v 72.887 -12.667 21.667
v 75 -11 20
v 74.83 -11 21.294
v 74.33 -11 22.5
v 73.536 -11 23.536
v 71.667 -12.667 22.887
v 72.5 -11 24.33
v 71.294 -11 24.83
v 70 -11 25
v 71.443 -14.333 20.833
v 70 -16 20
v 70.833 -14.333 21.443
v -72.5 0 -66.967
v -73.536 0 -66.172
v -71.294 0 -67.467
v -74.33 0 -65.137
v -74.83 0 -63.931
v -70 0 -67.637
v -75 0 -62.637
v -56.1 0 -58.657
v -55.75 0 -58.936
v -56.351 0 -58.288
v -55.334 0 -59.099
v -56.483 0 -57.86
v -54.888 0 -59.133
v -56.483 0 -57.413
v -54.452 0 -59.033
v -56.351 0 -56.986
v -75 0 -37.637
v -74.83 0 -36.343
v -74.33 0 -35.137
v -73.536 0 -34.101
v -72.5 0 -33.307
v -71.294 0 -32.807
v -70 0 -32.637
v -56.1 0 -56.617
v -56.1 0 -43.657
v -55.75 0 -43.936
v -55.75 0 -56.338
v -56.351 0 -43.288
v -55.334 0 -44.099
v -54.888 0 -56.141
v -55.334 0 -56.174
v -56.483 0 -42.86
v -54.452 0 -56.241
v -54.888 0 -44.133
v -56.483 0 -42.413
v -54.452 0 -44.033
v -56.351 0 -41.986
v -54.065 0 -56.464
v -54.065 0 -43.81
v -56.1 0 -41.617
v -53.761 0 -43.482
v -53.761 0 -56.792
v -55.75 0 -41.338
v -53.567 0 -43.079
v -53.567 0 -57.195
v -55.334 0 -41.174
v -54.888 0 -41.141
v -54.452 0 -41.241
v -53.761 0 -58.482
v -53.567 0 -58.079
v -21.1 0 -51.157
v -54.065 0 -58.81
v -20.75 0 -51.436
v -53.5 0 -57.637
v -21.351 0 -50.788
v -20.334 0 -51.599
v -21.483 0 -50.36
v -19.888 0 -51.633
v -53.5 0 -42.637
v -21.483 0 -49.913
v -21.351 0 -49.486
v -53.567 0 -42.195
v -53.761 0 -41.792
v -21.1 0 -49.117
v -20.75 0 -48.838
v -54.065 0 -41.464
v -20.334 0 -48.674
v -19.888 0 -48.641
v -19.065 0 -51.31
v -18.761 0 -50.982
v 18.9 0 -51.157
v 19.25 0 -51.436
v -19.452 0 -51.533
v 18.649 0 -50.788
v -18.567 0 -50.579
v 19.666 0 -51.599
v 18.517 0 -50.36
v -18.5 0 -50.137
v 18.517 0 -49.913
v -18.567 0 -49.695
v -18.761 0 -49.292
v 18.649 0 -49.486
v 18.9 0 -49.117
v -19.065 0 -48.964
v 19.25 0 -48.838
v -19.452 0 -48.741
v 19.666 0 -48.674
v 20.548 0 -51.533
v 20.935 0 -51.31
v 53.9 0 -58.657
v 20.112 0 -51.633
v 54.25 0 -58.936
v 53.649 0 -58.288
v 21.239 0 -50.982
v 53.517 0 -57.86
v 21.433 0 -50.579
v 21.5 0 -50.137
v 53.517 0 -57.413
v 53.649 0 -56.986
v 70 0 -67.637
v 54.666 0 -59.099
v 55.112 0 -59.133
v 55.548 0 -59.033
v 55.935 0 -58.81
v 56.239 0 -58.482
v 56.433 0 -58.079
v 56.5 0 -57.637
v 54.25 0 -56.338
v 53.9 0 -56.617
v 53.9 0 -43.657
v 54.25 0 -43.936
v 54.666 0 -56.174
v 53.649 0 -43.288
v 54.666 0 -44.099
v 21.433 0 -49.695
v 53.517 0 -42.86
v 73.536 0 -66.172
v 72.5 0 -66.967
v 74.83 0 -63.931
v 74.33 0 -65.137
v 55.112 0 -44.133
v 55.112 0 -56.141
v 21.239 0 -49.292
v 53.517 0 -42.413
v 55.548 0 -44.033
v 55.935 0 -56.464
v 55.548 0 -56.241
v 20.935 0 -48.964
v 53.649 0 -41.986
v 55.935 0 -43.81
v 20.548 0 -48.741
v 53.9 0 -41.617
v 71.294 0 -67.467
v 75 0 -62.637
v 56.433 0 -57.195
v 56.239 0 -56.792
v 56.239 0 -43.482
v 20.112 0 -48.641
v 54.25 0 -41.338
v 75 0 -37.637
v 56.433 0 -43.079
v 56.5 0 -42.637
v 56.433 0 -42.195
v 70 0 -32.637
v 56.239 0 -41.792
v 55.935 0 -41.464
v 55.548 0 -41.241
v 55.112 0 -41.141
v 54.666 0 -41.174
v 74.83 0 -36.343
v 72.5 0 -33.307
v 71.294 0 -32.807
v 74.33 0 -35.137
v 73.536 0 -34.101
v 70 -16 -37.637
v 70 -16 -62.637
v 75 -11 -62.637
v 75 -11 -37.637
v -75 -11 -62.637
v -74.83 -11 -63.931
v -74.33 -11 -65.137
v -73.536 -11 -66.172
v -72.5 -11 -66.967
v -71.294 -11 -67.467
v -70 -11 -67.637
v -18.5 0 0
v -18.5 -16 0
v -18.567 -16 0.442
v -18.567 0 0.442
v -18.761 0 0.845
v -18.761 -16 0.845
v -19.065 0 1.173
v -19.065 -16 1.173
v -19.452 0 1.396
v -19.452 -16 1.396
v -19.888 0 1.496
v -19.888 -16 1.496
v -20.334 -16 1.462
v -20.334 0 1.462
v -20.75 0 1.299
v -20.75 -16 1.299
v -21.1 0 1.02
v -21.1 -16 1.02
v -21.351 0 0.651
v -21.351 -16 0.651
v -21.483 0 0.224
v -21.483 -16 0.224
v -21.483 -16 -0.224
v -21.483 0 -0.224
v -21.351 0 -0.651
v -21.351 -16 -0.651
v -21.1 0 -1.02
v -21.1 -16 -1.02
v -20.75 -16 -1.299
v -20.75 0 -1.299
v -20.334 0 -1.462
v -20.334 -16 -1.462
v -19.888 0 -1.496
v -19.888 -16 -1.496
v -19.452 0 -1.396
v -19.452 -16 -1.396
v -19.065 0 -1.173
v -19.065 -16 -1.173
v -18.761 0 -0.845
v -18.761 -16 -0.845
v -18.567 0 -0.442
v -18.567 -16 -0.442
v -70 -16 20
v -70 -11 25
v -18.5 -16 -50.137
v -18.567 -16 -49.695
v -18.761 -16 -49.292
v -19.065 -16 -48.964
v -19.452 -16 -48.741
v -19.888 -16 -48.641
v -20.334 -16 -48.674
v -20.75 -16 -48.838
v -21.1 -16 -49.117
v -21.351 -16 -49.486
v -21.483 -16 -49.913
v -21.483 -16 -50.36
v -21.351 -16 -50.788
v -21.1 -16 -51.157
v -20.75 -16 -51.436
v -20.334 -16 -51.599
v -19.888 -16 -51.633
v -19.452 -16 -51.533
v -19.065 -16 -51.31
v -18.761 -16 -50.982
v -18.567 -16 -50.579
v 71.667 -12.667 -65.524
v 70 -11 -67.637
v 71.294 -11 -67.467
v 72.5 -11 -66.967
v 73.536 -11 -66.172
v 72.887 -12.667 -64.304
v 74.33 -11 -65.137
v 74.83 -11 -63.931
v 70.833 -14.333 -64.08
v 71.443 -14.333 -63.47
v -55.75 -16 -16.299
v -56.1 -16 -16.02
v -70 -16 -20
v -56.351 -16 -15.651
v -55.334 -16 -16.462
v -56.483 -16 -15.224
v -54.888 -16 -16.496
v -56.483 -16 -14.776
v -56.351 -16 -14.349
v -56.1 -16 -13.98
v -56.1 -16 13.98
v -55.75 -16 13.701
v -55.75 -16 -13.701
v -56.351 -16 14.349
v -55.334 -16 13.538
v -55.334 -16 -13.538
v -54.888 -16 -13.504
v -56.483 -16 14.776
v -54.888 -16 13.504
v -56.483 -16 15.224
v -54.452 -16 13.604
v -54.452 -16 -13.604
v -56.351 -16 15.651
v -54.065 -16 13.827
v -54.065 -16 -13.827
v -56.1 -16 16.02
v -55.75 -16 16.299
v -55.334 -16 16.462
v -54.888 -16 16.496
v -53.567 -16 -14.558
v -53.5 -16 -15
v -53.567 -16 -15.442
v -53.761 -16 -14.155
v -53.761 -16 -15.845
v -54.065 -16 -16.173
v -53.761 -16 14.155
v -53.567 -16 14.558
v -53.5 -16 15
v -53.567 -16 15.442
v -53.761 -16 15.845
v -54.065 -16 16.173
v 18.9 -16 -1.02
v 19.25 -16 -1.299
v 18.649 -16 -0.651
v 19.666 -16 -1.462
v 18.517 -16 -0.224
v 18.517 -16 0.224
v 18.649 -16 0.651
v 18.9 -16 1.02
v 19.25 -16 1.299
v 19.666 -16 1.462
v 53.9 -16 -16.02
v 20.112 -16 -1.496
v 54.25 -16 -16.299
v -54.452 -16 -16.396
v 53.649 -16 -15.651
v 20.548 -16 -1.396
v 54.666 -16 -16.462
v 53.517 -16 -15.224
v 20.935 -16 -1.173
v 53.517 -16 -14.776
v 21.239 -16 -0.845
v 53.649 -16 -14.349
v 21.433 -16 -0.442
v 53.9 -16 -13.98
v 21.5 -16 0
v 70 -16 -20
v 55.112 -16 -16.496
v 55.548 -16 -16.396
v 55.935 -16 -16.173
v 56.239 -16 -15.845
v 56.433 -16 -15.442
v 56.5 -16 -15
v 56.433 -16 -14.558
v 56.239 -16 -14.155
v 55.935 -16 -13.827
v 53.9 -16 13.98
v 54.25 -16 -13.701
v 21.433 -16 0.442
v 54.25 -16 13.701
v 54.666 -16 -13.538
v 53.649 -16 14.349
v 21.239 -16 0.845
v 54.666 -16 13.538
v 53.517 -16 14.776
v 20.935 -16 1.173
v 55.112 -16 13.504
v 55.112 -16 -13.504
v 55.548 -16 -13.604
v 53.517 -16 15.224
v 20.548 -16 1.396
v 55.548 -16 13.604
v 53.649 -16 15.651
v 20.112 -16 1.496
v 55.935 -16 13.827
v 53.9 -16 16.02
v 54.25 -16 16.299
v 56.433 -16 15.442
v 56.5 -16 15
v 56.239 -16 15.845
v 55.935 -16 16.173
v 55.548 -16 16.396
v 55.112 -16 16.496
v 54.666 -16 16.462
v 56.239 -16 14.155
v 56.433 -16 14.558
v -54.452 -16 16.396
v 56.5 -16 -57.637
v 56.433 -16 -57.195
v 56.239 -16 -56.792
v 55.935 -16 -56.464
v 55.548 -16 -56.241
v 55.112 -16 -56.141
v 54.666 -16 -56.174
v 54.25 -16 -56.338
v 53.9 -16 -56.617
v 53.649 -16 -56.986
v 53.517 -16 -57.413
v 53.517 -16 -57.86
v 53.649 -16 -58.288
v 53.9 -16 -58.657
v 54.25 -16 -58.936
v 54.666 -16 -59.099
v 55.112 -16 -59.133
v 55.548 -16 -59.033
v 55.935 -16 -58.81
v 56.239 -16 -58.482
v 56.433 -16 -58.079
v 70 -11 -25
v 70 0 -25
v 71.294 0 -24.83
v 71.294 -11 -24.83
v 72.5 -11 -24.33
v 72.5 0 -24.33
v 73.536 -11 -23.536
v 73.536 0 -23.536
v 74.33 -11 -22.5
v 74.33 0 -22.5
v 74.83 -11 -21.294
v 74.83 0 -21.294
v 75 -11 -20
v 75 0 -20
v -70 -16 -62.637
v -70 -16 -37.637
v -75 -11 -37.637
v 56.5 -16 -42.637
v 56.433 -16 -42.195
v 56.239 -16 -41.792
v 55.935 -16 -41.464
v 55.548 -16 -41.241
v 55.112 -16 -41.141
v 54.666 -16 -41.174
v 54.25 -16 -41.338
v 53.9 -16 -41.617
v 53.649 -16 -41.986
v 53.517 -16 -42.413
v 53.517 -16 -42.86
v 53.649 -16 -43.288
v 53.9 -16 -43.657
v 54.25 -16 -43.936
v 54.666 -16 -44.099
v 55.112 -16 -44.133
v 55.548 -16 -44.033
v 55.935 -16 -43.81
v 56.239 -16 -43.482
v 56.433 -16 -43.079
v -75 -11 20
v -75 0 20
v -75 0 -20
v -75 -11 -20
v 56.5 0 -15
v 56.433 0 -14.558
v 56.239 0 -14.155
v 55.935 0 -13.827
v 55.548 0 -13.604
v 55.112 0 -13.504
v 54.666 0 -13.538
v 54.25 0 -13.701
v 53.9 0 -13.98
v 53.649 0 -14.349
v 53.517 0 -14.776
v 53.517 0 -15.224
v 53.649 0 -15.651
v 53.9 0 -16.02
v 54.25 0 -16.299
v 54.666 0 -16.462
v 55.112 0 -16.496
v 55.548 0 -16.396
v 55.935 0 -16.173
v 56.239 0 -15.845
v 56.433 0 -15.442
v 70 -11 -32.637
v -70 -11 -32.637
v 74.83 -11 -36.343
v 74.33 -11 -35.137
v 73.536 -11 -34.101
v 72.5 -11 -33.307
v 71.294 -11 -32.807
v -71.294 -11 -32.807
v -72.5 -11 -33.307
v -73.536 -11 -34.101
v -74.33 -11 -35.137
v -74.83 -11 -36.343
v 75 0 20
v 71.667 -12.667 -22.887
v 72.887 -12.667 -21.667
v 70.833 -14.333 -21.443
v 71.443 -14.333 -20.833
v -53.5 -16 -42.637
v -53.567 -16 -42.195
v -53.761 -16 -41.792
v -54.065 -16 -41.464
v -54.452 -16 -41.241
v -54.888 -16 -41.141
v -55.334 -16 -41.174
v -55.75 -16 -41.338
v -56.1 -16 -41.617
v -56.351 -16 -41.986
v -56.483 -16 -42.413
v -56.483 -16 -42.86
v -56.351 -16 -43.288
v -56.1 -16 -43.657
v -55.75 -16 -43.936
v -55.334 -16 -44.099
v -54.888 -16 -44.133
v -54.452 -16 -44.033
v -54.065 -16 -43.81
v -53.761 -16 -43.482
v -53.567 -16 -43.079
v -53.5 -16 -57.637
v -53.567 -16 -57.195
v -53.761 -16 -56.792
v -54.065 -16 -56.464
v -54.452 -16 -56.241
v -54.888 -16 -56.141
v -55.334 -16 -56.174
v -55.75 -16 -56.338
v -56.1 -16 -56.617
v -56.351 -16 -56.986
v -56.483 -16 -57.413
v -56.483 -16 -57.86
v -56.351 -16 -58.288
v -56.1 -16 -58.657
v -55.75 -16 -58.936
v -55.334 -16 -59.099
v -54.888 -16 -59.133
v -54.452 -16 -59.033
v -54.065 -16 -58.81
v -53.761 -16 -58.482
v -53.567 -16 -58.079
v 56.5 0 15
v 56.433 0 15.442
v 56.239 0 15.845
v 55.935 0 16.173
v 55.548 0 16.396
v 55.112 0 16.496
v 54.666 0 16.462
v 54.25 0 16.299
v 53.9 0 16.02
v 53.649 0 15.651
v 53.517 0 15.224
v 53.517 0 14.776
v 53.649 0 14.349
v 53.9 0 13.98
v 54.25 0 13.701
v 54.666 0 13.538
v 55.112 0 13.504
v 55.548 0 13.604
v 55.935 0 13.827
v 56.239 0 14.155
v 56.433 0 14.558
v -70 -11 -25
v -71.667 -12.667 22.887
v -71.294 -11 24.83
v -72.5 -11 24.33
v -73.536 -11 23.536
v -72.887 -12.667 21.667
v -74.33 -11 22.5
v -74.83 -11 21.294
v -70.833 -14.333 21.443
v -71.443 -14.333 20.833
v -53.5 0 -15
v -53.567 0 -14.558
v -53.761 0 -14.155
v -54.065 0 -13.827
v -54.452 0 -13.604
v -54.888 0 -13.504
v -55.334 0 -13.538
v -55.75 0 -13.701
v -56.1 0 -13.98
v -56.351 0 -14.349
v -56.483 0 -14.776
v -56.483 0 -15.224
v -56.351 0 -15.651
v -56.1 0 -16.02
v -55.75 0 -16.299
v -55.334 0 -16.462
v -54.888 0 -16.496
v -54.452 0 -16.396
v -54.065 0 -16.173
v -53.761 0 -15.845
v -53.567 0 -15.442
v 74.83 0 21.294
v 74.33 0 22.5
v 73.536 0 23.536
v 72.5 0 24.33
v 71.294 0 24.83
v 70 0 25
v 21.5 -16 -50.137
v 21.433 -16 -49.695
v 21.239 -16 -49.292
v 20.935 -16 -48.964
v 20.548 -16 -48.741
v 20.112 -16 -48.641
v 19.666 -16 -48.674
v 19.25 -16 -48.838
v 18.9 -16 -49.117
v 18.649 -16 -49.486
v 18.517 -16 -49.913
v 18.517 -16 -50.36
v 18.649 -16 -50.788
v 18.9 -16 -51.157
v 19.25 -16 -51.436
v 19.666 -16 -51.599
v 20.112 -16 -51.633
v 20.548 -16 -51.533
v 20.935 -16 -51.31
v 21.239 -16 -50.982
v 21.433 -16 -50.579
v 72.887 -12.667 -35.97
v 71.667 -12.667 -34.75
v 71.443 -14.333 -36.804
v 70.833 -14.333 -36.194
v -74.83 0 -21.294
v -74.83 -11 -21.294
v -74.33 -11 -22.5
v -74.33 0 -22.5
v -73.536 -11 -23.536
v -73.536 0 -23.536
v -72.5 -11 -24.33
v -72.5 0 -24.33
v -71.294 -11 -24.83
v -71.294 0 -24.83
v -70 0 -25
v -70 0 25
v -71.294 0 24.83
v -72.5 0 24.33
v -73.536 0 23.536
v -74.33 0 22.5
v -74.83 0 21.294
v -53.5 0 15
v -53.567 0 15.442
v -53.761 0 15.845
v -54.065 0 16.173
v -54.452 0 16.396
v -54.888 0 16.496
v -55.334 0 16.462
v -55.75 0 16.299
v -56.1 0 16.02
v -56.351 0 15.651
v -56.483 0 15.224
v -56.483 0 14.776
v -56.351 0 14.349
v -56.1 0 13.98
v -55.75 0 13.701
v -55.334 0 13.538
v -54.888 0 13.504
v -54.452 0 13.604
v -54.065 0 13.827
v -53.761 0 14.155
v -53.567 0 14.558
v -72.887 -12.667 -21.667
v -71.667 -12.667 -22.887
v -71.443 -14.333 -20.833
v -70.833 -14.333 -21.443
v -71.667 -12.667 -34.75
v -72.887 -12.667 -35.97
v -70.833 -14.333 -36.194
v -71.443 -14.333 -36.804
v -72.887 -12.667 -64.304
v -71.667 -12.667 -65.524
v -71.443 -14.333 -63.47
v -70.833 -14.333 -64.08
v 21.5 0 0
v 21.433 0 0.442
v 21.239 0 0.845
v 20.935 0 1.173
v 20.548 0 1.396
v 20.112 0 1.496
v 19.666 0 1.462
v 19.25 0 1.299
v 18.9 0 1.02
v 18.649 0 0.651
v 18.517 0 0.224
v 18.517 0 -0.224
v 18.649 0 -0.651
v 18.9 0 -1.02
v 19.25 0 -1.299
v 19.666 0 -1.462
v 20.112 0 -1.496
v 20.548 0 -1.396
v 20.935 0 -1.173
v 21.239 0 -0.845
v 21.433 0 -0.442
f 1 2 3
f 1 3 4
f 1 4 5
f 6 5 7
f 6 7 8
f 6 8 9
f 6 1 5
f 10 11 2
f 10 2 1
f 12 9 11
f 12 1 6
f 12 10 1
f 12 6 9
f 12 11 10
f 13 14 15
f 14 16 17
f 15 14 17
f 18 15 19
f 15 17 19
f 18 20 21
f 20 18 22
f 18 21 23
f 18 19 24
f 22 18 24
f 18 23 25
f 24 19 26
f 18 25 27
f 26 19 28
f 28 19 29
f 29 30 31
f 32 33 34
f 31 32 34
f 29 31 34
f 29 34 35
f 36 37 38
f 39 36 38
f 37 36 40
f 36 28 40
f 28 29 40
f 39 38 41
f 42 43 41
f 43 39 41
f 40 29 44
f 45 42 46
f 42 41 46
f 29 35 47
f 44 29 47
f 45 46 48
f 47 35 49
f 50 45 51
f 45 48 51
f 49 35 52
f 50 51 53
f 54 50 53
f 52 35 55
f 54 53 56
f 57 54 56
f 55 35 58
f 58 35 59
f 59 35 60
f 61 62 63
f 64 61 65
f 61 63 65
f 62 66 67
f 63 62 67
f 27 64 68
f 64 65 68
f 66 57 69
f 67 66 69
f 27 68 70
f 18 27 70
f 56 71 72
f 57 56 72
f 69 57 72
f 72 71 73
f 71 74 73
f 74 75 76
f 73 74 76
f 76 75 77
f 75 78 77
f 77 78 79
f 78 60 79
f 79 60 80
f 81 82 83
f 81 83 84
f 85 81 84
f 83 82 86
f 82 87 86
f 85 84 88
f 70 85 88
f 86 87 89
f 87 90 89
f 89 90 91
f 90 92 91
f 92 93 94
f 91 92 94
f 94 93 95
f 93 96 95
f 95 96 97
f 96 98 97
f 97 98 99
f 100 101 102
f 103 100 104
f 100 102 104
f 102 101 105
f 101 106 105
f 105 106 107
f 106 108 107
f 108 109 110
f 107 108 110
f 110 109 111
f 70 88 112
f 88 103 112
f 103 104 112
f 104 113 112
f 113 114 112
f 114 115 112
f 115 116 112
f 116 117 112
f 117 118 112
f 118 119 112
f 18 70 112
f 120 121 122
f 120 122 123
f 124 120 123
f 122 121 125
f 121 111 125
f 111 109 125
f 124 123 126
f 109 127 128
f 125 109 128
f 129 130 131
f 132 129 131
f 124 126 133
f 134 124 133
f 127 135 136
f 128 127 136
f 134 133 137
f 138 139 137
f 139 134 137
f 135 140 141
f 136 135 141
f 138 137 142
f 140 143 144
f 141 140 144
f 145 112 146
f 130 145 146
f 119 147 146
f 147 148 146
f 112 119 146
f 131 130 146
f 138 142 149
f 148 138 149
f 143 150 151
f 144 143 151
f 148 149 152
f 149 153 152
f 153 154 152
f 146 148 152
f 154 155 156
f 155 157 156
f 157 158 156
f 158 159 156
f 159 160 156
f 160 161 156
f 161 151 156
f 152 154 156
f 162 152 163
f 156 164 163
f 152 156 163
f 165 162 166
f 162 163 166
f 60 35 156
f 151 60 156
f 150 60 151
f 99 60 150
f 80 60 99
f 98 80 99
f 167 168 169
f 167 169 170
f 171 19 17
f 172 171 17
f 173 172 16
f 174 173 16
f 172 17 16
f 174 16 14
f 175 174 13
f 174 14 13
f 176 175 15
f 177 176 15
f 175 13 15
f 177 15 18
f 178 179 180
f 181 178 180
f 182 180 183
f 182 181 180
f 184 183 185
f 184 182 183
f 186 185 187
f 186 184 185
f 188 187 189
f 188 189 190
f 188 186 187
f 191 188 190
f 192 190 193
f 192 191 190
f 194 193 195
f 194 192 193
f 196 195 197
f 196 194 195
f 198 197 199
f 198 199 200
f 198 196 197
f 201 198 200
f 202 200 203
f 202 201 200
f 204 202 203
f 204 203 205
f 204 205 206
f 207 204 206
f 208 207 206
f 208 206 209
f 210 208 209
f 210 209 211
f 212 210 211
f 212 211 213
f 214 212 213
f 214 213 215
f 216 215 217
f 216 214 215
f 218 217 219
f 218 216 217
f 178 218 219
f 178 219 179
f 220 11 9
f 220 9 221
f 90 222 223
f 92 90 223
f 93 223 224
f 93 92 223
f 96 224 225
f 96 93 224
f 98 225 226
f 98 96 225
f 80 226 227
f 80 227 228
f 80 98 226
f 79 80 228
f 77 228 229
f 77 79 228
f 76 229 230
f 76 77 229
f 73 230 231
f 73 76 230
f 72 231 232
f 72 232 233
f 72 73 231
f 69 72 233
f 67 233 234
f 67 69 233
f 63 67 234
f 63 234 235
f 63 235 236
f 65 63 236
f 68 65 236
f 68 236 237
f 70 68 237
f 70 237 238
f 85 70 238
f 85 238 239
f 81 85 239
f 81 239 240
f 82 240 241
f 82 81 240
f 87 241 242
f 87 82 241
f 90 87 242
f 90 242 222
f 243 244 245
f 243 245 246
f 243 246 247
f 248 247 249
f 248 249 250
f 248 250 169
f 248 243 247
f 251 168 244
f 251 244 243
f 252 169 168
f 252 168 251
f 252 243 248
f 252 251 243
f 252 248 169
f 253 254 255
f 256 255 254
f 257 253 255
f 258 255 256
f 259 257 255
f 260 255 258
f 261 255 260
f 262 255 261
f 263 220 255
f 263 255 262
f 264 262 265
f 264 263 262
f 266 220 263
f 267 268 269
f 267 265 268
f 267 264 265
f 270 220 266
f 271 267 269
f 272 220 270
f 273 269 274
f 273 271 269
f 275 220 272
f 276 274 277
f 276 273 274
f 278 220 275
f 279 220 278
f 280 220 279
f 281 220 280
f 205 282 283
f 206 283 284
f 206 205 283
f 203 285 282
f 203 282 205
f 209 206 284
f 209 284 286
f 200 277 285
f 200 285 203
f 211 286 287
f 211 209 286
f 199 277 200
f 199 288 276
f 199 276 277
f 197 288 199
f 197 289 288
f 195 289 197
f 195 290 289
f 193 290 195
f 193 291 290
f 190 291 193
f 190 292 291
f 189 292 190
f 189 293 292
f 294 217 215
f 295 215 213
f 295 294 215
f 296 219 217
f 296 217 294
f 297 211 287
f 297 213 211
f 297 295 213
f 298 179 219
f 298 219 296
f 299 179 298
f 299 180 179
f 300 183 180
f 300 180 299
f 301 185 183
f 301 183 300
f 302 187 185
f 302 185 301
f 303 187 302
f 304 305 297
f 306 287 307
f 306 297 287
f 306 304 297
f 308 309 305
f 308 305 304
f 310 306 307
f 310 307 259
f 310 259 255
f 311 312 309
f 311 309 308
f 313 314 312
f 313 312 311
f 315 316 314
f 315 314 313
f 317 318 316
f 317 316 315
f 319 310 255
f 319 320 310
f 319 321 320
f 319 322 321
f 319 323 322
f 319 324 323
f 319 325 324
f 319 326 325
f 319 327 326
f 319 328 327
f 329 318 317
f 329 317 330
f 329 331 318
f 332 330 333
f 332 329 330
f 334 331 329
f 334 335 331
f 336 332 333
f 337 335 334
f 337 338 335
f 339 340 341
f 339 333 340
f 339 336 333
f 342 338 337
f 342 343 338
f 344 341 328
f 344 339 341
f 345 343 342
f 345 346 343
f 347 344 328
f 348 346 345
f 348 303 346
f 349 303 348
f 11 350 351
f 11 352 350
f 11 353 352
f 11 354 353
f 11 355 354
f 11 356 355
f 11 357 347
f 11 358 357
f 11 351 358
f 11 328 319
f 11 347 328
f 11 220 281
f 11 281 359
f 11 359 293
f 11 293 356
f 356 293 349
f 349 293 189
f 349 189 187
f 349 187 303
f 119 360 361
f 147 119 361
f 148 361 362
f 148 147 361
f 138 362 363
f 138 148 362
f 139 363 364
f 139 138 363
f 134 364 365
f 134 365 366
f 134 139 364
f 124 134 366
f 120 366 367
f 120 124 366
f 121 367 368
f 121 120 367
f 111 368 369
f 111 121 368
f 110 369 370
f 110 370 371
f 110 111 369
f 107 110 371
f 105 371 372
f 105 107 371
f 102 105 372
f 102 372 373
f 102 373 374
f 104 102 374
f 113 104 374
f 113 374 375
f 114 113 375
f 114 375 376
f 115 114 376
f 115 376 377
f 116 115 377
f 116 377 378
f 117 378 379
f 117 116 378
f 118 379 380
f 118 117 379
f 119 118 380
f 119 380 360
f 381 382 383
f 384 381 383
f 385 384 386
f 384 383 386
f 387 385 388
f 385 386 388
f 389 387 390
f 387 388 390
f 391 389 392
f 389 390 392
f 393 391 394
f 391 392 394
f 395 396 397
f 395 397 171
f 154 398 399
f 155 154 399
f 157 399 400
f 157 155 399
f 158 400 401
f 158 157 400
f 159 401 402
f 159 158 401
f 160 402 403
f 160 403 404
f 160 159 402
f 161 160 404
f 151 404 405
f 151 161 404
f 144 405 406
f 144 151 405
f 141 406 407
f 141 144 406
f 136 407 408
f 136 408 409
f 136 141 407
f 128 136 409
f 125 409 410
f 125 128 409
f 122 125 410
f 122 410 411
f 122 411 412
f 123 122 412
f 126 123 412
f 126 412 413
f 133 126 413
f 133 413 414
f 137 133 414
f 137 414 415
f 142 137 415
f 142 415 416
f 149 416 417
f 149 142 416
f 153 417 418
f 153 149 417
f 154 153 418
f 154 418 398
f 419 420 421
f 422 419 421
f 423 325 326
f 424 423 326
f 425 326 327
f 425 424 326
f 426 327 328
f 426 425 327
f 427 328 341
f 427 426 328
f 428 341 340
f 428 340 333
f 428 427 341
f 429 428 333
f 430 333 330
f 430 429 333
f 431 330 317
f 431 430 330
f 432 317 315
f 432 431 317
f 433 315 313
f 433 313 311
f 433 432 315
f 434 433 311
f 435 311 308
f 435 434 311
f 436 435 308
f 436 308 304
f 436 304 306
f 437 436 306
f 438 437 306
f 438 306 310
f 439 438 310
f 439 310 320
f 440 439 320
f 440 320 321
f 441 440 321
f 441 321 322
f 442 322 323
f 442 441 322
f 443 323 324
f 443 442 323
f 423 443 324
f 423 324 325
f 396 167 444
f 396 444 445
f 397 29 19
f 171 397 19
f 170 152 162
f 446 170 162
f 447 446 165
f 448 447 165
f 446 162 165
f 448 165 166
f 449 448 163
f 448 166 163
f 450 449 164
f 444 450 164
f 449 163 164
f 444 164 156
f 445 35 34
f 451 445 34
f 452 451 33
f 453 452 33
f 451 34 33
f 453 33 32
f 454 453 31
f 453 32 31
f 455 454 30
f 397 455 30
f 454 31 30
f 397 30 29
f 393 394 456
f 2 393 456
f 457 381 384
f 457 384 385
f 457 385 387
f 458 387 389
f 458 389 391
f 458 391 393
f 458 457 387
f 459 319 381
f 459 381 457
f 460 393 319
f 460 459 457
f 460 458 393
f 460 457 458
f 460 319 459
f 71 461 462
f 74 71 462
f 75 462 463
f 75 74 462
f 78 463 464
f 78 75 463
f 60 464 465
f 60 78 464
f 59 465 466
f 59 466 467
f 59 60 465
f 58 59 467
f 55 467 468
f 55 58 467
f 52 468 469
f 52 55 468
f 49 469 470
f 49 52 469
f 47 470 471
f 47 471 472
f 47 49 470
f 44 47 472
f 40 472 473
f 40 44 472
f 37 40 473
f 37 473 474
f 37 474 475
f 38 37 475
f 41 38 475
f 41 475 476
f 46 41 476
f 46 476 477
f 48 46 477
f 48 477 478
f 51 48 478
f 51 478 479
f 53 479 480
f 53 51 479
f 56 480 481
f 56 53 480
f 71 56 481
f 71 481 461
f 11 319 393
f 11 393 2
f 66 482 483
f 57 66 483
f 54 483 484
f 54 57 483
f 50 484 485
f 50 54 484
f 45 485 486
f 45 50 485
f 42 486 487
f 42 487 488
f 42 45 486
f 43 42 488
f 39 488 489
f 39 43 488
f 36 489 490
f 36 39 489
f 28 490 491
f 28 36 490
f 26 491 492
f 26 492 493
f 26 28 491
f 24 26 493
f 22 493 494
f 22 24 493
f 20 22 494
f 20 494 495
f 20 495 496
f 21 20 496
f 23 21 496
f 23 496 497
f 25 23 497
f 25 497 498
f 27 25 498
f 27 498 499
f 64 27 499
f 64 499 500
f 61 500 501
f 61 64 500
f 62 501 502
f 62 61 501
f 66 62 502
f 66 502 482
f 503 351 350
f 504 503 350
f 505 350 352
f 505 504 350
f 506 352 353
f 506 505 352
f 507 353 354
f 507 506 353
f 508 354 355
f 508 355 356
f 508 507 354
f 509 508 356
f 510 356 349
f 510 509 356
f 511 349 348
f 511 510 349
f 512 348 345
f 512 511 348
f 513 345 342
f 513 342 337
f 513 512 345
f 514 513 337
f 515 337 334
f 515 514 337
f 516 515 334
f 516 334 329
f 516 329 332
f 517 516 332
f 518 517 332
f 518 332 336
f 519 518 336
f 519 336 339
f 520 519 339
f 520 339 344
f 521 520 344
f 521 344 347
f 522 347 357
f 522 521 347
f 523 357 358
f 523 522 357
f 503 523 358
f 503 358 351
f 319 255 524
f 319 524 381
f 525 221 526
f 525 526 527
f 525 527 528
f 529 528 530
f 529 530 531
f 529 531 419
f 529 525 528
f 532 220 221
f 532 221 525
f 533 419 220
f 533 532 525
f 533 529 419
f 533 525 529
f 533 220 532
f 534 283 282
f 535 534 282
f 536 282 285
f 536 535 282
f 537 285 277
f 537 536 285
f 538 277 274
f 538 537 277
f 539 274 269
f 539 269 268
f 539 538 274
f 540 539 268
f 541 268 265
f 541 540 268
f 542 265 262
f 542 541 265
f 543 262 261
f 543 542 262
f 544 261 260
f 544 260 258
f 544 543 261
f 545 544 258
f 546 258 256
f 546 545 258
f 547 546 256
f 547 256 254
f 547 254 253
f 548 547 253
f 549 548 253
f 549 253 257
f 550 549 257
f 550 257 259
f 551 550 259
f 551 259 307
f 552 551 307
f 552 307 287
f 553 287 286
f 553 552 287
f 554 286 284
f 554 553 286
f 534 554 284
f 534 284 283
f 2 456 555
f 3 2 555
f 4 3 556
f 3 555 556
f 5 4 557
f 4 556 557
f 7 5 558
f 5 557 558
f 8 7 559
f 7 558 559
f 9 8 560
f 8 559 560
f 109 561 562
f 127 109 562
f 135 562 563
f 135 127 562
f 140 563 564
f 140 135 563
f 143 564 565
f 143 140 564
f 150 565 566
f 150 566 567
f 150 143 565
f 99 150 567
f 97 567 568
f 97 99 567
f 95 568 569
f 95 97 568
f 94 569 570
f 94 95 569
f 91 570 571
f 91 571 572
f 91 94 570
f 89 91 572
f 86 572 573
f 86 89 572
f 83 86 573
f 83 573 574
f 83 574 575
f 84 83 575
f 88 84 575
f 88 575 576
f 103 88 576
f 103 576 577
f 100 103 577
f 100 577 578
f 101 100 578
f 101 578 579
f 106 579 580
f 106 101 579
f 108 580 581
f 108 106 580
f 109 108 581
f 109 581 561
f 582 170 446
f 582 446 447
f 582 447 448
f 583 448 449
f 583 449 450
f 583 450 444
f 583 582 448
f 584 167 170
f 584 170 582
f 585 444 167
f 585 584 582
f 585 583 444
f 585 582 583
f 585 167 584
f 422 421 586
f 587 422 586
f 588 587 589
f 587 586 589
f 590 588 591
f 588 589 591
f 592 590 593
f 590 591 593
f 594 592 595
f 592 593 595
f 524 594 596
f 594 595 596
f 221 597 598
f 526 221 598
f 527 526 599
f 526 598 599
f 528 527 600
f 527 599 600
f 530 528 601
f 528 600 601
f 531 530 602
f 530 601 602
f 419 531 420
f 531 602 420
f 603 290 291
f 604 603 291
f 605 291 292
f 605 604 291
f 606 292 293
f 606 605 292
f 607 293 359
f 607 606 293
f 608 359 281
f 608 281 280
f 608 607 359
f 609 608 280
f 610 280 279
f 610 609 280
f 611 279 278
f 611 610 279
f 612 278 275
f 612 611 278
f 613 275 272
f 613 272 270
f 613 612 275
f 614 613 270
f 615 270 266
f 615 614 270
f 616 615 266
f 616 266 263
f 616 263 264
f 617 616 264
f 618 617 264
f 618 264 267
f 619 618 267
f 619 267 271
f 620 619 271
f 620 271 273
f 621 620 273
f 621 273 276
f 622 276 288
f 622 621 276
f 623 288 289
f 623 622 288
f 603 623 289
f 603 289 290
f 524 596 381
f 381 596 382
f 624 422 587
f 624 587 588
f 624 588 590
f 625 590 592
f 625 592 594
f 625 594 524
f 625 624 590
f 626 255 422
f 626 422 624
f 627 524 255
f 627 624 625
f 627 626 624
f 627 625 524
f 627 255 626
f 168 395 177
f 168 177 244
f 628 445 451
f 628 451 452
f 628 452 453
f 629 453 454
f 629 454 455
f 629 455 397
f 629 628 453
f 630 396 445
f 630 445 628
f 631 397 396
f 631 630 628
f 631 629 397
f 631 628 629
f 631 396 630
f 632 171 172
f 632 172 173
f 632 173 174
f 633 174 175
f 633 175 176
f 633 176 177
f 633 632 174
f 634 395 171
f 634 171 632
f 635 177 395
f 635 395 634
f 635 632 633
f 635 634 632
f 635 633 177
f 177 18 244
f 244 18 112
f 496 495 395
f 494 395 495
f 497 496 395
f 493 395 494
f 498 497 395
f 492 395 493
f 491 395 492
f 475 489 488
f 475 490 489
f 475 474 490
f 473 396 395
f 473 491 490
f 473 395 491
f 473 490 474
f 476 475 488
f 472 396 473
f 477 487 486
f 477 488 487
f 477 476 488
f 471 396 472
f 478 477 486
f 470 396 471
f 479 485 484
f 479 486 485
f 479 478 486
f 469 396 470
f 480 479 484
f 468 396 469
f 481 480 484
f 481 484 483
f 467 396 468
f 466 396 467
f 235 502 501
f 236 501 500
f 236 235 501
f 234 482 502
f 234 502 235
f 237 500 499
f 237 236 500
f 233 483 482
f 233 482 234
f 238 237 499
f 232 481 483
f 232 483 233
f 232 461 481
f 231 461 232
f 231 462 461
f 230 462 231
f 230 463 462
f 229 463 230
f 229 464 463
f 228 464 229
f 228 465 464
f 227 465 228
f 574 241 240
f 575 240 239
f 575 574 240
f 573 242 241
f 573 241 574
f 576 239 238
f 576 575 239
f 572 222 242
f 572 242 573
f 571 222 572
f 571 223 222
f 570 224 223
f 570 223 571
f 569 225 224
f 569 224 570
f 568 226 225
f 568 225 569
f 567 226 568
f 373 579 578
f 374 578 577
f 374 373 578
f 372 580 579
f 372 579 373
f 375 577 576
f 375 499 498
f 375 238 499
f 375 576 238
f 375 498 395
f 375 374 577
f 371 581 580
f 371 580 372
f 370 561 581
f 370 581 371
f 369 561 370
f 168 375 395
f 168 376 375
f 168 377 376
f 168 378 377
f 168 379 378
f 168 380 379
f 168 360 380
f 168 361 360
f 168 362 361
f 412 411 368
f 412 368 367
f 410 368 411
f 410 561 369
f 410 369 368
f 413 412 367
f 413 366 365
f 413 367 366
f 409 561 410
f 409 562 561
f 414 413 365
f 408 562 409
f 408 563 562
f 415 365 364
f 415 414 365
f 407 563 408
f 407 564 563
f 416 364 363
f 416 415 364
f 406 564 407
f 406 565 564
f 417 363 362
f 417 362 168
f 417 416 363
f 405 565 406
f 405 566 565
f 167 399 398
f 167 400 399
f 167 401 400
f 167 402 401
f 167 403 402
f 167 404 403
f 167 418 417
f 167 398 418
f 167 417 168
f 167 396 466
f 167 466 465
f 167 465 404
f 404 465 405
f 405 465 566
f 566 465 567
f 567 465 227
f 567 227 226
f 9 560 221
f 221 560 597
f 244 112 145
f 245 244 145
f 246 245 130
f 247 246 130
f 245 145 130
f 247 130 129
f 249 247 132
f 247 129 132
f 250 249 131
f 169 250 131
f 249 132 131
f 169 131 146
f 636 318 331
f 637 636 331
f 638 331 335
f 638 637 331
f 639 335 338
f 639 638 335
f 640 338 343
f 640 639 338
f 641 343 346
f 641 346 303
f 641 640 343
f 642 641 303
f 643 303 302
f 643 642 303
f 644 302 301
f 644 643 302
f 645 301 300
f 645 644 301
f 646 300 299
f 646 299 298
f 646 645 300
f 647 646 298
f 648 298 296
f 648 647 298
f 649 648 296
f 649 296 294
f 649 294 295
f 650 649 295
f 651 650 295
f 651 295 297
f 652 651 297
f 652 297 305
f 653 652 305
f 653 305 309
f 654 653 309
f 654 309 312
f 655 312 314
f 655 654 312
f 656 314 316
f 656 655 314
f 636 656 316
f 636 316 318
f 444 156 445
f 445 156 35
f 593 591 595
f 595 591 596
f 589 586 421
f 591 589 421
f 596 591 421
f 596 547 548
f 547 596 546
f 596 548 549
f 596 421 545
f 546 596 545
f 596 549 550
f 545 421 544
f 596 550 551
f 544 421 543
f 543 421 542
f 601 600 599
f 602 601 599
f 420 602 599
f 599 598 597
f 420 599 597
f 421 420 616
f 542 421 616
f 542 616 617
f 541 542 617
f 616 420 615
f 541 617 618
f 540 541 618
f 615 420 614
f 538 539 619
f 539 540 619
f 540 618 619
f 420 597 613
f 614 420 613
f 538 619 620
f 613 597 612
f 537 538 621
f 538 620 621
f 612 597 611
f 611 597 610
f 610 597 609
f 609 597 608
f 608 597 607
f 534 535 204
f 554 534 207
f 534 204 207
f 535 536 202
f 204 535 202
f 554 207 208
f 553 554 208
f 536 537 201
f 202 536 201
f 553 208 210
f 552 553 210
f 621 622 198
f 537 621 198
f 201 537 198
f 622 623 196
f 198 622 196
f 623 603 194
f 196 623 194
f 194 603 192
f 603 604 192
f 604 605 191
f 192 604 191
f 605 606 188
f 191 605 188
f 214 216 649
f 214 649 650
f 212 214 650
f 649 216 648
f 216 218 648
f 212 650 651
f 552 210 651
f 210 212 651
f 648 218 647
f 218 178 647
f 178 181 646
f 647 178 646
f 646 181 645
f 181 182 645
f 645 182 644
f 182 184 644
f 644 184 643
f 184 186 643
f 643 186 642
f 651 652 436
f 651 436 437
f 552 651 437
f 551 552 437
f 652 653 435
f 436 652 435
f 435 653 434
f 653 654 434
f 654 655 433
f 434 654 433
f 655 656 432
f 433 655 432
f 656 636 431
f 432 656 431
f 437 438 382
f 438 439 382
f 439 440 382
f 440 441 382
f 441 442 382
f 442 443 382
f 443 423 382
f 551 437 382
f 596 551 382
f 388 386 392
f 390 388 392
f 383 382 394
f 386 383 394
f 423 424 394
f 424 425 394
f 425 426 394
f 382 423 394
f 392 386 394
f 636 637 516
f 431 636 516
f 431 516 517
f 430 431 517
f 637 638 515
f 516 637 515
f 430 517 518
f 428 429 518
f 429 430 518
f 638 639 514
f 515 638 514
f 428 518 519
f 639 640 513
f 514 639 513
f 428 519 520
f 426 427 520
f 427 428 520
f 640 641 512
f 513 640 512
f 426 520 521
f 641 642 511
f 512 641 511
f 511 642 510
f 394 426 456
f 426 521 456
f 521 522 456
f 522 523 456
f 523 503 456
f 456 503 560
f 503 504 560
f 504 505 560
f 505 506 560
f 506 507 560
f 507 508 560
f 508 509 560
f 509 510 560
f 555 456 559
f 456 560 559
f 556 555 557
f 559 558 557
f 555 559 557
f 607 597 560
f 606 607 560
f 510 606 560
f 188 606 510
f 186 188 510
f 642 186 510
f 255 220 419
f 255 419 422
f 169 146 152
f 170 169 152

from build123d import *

# Parameters (mm, degrees)
F0_R      = 1.5
F1_DEPTH  = 16
F2_SIZE   = 4.99999
F2_2_SIZE = 4.99999


# Not quite as in the source:
# - a fillet or chamfer is up to 0.001 mm smaller than in the source, because OpenCascade refuses the exact size


with BuildPart() as f1:
    # F0 (on Front) → F1 (new body)
    with BuildSketch(Plane.XZ):
        with BuildLine():
            Line((70, 25), (-70, 25))
            ThreePointArc((-70, 25), (-73.5355339059, 23.5355339059), (-75, 20))
            Line((-75, 20), (-75, -20))
            ThreePointArc((-75, -20), (-73.5355339059, -23.5355339059), (-70, -25))
            Line((-70, -25), (70, -25))
            ThreePointArc((70, -25), (73.5355339059, -23.5355339059), (75, -20))
            Line((75, -20), (75, 20))
            ThreePointArc((75, 20), (73.5355339059, 23.5355339059), (70, 25))
        make_face()
        with Locations((-55, -15)):
            Circle(F0_R, mode=Mode.SUBTRACT)
        with Locations((-20, 0)):
            Circle(F0_R, mode=Mode.SUBTRACT)
        with Locations((-55, 15)):
            Circle(F0_R, mode=Mode.SUBTRACT)
        with Locations((20, 0)):
            Circle(F0_R, mode=Mode.SUBTRACT)
        with Locations((55, -15)):
            Circle(F0_R, mode=Mode.SUBTRACT)
        with Locations((55, 15)):
            Circle(F0_R, mode=Mode.SUBTRACT)
    extrude(amount=F1_DEPTH)

    # F2 (size 5 in the source; OpenCascade refuses exactly that, so slightly less here)
    f2_edges = [f1.edges().sort_by_distance(p)[0] for p in [
        (0, -16, 25),
        (-73.535534, -16, 23.535534),
        (-75, -16, 0),
        (-73.535534, -16, -23.535534),
        (0, -16, -25),
        (73.535534, -16, -23.535534),
        (75, -16, 0),
        (73.535534, -16, 23.535534),
    ]]
    chamfer(f2_edges, length=F2_SIZE)


with BuildPart() as f1b:
    # F0 (on Front) → F1, piece 2 (new body)
    with BuildSketch(Plane.XZ):
        with BuildLine():
            ThreePointArc((-70, -32.6368902624), (-73.5355339059, -34.1013563564), (-75, -37.6368902624))
            Line((-75, -37.6368902624), (-75, -62.6368902624))
            ThreePointArc((-75, -62.6368902624), (-73.5355339059, -66.1724241683), (-70, -67.6368902624))
            Line((-70, -67.6368902624), (70, -67.6368902624))
            ThreePointArc((70, -67.6368902624), (73.5355339059, -66.1724241683), (75, -62.6368902624))
            Line((75, -62.6368902624), (75, -37.6368902624))
            ThreePointArc((75, -37.6368902624), (73.5355339059, -34.1013563564), (70, -32.6368902624))
            Line((70, -32.6368902624), (-70, -32.6368902624))
        make_face()
        with Locations((-55, -57.6368902624)):
            Circle(F0_R, mode=Mode.SUBTRACT)
        with Locations((-20, -50.1368902624)):
            Circle(F0_R, mode=Mode.SUBTRACT)
        with Locations((-55, -42.6368902624)):
            Circle(F0_R, mode=Mode.SUBTRACT)
        with Locations((20, -50.1368902624)):
            Circle(F0_R, mode=Mode.SUBTRACT)
        with Locations((55, -57.6368902624)):
            Circle(F0_R, mode=Mode.SUBTRACT)
        with Locations((55, -42.6368902624)):
            Circle(F0_R, mode=Mode.SUBTRACT)
    extrude(amount=F1_DEPTH)

    # F2#2 (size 5 in the source; OpenCascade refuses exactly that, so slightly less here)
    f2_2_edges = [f1b.edges().sort_by_distance(p)[0] for p in [
        (0, -16, -32.63689),
        (0, -16, -67.63689),
        (73.535534, -16, -66.172424),
        (75, -16, -50.13689),
        (73.535534, -16, -34.101356),
        (-73.535534, -16, -34.101356),
        (-75, -16, -50.13689),
        (-73.535534, -16, -66.172424),
    ]]
    chamfer(f2_2_edges, length=F2_2_SIZE)


solid = Compound([f1.part, f1b.part])
